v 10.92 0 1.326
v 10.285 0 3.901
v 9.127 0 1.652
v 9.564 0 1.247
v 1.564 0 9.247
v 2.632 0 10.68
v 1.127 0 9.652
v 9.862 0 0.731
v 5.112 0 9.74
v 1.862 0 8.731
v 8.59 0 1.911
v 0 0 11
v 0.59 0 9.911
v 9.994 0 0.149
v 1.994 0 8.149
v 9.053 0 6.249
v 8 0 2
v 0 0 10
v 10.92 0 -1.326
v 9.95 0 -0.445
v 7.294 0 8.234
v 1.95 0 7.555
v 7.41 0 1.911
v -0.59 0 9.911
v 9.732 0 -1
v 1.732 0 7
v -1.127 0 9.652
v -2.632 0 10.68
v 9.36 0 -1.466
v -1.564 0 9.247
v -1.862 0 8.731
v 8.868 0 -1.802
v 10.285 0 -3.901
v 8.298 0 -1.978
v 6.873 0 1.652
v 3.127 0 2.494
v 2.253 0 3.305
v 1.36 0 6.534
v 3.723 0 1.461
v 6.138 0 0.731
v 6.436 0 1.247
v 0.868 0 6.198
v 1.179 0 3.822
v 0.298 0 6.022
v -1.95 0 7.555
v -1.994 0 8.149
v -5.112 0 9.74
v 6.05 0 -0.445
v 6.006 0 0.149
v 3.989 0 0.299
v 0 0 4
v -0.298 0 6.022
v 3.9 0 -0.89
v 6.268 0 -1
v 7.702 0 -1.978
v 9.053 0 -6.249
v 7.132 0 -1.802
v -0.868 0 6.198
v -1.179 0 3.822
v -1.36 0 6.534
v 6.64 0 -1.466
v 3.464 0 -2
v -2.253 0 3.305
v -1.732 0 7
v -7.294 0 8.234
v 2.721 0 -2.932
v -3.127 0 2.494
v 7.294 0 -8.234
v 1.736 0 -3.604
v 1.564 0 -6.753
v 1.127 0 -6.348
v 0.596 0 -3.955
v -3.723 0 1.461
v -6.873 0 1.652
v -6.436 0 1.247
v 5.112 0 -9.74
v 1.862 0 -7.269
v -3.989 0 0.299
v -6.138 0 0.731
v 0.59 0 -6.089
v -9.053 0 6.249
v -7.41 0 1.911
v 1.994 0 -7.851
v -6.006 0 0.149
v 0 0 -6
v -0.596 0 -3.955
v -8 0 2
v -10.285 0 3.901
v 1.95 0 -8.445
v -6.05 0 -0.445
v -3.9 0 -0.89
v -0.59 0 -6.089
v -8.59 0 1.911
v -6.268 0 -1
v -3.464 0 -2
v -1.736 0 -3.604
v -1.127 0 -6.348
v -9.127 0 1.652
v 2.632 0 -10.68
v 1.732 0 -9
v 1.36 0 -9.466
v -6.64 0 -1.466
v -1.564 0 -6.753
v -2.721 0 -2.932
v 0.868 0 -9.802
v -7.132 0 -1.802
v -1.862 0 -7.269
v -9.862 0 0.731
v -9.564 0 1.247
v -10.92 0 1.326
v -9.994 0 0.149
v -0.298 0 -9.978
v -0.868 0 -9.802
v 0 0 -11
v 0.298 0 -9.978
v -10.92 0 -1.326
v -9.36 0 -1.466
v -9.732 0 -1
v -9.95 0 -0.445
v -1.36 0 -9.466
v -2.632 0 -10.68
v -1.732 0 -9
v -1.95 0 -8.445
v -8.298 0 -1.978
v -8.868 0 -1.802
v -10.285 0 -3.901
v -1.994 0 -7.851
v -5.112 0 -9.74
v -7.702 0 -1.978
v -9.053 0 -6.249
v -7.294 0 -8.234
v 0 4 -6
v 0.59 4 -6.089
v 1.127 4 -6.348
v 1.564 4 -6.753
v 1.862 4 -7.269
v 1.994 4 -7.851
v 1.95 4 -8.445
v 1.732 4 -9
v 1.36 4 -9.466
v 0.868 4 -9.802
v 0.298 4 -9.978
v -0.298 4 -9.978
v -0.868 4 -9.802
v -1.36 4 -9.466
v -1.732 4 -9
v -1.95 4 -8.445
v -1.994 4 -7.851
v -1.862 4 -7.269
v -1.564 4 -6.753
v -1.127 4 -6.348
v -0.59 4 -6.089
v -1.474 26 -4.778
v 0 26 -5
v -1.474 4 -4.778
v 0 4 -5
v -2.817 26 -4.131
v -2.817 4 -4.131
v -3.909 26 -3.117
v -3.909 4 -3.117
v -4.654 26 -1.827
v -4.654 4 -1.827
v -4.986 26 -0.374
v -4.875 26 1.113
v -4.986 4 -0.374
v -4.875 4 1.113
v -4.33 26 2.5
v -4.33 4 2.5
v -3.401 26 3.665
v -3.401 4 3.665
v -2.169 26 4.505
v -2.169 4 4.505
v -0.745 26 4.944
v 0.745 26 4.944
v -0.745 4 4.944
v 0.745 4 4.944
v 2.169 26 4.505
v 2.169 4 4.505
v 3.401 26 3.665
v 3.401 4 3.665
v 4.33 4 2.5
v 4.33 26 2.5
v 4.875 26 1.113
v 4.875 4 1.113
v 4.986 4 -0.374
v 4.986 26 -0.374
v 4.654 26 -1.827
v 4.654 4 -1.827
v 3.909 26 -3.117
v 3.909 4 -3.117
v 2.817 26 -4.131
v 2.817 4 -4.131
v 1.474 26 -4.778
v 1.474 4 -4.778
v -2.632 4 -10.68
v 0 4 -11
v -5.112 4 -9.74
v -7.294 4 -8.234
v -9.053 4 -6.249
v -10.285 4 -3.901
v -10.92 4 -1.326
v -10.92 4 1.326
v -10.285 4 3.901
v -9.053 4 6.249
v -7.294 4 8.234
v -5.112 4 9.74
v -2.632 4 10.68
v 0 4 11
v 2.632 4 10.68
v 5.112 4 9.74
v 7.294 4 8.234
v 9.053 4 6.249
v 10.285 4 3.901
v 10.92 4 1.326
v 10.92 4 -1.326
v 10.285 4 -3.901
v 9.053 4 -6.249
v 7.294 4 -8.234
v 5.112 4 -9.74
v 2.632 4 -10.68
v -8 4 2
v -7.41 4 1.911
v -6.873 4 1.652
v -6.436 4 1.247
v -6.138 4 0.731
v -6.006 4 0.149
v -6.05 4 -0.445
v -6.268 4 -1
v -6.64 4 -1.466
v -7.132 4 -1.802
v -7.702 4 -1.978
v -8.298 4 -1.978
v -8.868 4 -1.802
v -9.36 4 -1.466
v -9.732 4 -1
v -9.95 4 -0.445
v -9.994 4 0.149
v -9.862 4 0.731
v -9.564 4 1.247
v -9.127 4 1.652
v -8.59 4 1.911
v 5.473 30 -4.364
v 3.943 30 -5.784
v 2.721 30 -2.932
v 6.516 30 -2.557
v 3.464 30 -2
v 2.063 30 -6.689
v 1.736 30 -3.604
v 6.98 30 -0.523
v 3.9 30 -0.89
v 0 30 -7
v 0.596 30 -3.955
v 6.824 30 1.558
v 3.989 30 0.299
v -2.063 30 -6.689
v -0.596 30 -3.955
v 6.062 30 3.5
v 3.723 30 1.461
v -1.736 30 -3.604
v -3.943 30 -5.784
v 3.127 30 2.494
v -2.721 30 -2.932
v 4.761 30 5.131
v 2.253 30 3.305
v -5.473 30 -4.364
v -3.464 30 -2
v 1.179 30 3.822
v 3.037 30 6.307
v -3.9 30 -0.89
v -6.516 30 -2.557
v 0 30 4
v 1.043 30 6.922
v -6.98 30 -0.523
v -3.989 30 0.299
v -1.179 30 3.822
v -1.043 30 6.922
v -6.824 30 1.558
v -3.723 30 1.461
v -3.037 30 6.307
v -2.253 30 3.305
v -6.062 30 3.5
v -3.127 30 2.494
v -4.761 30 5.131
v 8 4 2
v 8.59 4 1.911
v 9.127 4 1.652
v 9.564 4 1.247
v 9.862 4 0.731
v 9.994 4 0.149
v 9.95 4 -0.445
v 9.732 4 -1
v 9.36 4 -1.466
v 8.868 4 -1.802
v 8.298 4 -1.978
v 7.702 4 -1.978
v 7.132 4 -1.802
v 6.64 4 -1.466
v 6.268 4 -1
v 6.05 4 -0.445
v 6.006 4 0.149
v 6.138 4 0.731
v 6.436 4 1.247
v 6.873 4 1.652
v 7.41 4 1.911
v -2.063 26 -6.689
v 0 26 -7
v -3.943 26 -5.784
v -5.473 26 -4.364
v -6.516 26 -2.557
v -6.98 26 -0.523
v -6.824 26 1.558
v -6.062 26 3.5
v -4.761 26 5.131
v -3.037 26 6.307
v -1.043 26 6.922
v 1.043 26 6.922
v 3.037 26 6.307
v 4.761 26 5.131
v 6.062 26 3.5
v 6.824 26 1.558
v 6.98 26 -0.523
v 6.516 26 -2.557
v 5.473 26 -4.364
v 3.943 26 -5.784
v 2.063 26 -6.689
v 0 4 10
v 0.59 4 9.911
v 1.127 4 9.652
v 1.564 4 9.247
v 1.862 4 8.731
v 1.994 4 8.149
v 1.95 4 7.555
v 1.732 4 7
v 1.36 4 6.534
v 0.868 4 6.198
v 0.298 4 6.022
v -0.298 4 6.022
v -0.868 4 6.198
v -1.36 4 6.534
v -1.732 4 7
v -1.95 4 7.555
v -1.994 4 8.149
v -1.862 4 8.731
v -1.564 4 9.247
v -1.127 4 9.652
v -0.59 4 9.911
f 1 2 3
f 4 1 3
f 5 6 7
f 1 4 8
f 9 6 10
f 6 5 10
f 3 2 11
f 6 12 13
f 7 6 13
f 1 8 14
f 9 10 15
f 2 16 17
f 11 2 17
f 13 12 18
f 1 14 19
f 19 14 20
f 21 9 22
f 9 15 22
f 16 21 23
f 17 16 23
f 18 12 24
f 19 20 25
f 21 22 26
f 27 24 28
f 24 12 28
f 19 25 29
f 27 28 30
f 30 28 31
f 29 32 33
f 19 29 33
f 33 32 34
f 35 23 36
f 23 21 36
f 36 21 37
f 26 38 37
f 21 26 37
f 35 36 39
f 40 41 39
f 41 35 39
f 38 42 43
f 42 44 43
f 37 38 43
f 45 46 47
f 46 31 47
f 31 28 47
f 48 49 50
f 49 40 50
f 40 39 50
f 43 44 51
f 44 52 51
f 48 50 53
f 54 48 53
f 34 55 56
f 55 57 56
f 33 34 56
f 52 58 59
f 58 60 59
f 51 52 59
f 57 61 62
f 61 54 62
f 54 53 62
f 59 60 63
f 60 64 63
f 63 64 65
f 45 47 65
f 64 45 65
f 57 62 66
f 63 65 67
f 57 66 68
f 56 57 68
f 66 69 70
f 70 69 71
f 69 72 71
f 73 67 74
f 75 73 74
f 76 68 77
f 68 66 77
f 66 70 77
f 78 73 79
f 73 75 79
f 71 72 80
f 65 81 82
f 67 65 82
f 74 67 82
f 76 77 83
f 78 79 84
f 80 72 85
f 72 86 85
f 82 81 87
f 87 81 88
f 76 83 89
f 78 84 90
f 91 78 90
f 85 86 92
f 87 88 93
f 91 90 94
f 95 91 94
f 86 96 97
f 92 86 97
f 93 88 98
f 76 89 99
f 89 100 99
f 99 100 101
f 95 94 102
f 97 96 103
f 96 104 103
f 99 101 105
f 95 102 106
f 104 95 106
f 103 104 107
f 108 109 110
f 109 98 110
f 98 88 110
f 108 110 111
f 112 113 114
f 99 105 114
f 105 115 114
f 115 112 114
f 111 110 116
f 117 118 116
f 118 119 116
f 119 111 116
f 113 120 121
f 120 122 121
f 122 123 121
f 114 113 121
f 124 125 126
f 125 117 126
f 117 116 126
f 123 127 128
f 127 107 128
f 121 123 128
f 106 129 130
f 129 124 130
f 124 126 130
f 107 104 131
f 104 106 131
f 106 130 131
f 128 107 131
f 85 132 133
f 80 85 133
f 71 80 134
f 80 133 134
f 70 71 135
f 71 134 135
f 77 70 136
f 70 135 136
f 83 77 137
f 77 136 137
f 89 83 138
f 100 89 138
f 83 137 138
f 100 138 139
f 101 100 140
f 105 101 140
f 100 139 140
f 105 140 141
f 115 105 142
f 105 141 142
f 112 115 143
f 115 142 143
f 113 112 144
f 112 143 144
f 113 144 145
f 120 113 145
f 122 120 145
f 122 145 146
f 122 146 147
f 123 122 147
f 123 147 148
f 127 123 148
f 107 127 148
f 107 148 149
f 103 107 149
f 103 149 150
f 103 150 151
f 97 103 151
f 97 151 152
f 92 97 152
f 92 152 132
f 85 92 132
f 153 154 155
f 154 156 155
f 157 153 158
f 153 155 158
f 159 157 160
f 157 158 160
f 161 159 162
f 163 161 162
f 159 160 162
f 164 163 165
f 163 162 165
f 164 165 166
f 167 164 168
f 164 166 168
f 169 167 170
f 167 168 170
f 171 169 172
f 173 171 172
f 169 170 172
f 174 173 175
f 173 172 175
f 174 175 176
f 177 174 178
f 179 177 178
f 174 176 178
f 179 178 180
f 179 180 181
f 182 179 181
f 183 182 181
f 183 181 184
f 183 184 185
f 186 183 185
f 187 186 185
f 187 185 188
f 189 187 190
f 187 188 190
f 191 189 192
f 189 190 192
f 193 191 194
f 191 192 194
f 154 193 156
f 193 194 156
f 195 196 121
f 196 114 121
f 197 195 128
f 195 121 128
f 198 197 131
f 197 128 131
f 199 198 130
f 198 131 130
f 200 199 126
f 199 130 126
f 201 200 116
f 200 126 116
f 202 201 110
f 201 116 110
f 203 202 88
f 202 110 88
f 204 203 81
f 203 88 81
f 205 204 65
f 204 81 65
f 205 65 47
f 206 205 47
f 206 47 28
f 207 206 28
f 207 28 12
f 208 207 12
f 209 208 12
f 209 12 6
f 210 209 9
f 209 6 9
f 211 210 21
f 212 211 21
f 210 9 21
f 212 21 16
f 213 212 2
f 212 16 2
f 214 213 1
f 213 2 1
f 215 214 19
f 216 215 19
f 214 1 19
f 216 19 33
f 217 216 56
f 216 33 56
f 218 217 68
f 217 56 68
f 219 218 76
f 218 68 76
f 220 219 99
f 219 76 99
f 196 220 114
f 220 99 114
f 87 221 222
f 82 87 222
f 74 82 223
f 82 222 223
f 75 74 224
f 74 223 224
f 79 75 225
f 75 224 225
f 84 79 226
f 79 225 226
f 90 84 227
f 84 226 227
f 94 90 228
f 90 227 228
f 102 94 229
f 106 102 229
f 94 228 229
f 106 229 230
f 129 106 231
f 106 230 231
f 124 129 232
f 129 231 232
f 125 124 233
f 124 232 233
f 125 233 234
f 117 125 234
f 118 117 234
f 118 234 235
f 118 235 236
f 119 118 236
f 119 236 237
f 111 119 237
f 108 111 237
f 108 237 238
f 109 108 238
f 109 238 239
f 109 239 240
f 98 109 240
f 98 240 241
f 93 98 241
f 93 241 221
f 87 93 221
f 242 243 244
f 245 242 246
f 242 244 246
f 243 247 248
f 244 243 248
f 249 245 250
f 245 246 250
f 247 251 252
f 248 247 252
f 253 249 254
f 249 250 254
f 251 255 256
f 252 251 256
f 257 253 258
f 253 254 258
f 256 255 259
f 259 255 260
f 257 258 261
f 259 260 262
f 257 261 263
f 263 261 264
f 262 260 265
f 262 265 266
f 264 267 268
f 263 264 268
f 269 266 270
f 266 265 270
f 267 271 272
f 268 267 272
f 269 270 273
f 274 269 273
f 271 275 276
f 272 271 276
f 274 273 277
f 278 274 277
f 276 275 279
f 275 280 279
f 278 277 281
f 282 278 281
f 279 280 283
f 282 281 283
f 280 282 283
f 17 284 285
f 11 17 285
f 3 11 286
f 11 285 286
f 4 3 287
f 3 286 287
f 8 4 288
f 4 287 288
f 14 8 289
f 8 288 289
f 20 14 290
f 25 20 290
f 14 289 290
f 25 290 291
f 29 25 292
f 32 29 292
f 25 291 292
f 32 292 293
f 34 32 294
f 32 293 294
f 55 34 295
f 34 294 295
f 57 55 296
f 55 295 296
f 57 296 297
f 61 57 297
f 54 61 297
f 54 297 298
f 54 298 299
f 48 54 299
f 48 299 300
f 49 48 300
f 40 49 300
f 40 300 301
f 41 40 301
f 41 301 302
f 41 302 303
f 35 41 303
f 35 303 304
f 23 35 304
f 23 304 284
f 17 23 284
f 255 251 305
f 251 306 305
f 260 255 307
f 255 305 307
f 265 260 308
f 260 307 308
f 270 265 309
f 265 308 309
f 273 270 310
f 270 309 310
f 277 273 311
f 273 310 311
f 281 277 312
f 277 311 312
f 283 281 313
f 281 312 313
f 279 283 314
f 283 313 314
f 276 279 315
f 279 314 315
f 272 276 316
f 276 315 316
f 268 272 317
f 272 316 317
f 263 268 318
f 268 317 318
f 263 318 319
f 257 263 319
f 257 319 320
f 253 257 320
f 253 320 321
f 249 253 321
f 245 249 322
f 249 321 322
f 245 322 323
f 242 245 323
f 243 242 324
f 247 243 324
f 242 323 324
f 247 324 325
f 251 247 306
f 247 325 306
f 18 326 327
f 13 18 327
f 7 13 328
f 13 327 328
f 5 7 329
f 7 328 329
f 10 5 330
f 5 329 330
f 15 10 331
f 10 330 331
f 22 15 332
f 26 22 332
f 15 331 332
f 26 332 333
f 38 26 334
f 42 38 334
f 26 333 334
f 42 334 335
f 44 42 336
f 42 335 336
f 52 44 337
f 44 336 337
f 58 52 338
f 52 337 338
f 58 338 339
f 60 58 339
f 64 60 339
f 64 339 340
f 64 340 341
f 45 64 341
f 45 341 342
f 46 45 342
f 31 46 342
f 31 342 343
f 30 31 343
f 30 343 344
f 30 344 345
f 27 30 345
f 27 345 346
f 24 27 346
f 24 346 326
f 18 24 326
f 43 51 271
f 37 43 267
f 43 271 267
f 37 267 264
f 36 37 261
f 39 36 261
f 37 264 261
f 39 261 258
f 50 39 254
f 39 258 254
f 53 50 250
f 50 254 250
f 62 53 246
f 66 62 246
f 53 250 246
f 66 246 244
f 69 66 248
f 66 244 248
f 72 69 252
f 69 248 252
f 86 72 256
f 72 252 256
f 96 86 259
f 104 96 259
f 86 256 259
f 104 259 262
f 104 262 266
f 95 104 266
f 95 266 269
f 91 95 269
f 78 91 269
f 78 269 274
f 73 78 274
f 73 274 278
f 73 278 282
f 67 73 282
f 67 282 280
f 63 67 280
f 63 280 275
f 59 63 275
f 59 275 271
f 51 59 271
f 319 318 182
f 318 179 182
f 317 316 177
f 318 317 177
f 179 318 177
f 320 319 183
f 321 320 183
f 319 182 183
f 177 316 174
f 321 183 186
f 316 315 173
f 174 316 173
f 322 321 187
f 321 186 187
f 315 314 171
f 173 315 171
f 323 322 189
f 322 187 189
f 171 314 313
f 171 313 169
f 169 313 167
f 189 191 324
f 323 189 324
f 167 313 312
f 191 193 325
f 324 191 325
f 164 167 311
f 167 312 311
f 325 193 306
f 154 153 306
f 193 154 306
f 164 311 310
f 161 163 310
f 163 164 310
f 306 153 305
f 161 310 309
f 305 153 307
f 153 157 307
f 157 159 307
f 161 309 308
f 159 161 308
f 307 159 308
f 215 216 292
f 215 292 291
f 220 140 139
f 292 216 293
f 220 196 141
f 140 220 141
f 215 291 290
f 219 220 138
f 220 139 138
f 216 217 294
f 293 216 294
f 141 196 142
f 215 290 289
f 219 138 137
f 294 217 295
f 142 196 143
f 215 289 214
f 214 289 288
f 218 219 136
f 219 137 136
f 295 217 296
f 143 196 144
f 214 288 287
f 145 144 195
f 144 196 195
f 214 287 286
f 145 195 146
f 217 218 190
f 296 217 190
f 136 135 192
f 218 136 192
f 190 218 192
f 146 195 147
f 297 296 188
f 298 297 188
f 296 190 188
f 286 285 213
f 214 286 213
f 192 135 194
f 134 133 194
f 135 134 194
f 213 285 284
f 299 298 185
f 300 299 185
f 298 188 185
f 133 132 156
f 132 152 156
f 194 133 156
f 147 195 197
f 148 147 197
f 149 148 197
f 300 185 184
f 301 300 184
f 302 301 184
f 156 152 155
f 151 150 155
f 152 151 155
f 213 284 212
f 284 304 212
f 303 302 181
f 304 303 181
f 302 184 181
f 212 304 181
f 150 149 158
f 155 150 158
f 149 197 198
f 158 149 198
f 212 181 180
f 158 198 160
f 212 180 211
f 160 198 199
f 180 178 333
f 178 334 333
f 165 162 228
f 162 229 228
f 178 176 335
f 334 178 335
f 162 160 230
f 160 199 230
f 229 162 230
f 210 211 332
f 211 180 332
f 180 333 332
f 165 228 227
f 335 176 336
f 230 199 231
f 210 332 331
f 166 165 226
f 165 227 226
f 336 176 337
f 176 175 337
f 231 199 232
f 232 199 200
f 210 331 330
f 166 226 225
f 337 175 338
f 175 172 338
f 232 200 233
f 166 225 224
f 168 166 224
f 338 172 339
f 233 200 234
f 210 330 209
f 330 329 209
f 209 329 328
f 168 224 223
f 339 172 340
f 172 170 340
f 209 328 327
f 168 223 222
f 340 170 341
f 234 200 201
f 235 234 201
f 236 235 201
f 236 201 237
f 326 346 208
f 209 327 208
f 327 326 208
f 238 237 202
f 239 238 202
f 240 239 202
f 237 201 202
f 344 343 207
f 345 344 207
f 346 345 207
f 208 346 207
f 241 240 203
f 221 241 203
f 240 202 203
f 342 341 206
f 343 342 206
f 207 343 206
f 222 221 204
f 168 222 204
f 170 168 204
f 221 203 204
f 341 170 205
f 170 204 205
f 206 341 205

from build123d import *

# Parameters (mm, degrees)
SKETCH_2_R          = 4
CUT_EXTRUDE_1_DEPTH = 31.6
SKETCH_4_R          = 2
CUT_EXTRUDE_2_DEPTH = 31.6


with BuildPart() as part:
    # Эскиз1 → Повернуть1 (revolve)
    with BuildSketch(Plane.XY, mode=Mode.PRIVATE) as revolve_1_sk:
        Polygon((0, 0), (0, 30), (7, 30), (7, 26), (5, 26), (5, 4), (11, 4), (11, 0), align=None)
    revolve(revolve_1_sk.sketch.rotate(Axis((0, 0, 0), (0, 1, 0)), 90), axis=Axis((0, 0, 0), (0, 1, 0)))

    # Эскиз2 → Вырез-Вытянуть1 (cut)
    with BuildSketch(Plane(origin=(0, 30, 0), x_dir=(1, 0, 0), z_dir=(0, 1, 0))):
        with Locations(Location((0, 0, 0), (0, 0, 270))):
            Circle(SKETCH_2_R)
    extrude(amount=-CUT_EXTRUDE_1_DEPTH, mode=Mode.SUBTRACT)

    # Эскиз4 → Вырез-Вытянуть2 (cut)
    with BuildSketch(Plane(origin=(0, 4, 0), x_dir=(1, 0, 0), z_dir=(0, 1, 0))):
        with Locations(Location((8, 0, 0), (0, 0, 270))):
            Circle(SKETCH_4_R)
        with Locations(Location((0, 8, 0), (0, 0, 270))):
            Circle(SKETCH_4_R)
        with Locations(Location((-8, 0, 0), (0, 0, 270))):
            Circle(SKETCH_4_R)
        with Locations(Location((0, -8, 0), (0, 0, 270))):
            Circle(SKETCH_4_R)
    extrude(amount=-CUT_EXTRUDE_2_DEPTH, mode=Mode.SUBTRACT)


solid = part.part
